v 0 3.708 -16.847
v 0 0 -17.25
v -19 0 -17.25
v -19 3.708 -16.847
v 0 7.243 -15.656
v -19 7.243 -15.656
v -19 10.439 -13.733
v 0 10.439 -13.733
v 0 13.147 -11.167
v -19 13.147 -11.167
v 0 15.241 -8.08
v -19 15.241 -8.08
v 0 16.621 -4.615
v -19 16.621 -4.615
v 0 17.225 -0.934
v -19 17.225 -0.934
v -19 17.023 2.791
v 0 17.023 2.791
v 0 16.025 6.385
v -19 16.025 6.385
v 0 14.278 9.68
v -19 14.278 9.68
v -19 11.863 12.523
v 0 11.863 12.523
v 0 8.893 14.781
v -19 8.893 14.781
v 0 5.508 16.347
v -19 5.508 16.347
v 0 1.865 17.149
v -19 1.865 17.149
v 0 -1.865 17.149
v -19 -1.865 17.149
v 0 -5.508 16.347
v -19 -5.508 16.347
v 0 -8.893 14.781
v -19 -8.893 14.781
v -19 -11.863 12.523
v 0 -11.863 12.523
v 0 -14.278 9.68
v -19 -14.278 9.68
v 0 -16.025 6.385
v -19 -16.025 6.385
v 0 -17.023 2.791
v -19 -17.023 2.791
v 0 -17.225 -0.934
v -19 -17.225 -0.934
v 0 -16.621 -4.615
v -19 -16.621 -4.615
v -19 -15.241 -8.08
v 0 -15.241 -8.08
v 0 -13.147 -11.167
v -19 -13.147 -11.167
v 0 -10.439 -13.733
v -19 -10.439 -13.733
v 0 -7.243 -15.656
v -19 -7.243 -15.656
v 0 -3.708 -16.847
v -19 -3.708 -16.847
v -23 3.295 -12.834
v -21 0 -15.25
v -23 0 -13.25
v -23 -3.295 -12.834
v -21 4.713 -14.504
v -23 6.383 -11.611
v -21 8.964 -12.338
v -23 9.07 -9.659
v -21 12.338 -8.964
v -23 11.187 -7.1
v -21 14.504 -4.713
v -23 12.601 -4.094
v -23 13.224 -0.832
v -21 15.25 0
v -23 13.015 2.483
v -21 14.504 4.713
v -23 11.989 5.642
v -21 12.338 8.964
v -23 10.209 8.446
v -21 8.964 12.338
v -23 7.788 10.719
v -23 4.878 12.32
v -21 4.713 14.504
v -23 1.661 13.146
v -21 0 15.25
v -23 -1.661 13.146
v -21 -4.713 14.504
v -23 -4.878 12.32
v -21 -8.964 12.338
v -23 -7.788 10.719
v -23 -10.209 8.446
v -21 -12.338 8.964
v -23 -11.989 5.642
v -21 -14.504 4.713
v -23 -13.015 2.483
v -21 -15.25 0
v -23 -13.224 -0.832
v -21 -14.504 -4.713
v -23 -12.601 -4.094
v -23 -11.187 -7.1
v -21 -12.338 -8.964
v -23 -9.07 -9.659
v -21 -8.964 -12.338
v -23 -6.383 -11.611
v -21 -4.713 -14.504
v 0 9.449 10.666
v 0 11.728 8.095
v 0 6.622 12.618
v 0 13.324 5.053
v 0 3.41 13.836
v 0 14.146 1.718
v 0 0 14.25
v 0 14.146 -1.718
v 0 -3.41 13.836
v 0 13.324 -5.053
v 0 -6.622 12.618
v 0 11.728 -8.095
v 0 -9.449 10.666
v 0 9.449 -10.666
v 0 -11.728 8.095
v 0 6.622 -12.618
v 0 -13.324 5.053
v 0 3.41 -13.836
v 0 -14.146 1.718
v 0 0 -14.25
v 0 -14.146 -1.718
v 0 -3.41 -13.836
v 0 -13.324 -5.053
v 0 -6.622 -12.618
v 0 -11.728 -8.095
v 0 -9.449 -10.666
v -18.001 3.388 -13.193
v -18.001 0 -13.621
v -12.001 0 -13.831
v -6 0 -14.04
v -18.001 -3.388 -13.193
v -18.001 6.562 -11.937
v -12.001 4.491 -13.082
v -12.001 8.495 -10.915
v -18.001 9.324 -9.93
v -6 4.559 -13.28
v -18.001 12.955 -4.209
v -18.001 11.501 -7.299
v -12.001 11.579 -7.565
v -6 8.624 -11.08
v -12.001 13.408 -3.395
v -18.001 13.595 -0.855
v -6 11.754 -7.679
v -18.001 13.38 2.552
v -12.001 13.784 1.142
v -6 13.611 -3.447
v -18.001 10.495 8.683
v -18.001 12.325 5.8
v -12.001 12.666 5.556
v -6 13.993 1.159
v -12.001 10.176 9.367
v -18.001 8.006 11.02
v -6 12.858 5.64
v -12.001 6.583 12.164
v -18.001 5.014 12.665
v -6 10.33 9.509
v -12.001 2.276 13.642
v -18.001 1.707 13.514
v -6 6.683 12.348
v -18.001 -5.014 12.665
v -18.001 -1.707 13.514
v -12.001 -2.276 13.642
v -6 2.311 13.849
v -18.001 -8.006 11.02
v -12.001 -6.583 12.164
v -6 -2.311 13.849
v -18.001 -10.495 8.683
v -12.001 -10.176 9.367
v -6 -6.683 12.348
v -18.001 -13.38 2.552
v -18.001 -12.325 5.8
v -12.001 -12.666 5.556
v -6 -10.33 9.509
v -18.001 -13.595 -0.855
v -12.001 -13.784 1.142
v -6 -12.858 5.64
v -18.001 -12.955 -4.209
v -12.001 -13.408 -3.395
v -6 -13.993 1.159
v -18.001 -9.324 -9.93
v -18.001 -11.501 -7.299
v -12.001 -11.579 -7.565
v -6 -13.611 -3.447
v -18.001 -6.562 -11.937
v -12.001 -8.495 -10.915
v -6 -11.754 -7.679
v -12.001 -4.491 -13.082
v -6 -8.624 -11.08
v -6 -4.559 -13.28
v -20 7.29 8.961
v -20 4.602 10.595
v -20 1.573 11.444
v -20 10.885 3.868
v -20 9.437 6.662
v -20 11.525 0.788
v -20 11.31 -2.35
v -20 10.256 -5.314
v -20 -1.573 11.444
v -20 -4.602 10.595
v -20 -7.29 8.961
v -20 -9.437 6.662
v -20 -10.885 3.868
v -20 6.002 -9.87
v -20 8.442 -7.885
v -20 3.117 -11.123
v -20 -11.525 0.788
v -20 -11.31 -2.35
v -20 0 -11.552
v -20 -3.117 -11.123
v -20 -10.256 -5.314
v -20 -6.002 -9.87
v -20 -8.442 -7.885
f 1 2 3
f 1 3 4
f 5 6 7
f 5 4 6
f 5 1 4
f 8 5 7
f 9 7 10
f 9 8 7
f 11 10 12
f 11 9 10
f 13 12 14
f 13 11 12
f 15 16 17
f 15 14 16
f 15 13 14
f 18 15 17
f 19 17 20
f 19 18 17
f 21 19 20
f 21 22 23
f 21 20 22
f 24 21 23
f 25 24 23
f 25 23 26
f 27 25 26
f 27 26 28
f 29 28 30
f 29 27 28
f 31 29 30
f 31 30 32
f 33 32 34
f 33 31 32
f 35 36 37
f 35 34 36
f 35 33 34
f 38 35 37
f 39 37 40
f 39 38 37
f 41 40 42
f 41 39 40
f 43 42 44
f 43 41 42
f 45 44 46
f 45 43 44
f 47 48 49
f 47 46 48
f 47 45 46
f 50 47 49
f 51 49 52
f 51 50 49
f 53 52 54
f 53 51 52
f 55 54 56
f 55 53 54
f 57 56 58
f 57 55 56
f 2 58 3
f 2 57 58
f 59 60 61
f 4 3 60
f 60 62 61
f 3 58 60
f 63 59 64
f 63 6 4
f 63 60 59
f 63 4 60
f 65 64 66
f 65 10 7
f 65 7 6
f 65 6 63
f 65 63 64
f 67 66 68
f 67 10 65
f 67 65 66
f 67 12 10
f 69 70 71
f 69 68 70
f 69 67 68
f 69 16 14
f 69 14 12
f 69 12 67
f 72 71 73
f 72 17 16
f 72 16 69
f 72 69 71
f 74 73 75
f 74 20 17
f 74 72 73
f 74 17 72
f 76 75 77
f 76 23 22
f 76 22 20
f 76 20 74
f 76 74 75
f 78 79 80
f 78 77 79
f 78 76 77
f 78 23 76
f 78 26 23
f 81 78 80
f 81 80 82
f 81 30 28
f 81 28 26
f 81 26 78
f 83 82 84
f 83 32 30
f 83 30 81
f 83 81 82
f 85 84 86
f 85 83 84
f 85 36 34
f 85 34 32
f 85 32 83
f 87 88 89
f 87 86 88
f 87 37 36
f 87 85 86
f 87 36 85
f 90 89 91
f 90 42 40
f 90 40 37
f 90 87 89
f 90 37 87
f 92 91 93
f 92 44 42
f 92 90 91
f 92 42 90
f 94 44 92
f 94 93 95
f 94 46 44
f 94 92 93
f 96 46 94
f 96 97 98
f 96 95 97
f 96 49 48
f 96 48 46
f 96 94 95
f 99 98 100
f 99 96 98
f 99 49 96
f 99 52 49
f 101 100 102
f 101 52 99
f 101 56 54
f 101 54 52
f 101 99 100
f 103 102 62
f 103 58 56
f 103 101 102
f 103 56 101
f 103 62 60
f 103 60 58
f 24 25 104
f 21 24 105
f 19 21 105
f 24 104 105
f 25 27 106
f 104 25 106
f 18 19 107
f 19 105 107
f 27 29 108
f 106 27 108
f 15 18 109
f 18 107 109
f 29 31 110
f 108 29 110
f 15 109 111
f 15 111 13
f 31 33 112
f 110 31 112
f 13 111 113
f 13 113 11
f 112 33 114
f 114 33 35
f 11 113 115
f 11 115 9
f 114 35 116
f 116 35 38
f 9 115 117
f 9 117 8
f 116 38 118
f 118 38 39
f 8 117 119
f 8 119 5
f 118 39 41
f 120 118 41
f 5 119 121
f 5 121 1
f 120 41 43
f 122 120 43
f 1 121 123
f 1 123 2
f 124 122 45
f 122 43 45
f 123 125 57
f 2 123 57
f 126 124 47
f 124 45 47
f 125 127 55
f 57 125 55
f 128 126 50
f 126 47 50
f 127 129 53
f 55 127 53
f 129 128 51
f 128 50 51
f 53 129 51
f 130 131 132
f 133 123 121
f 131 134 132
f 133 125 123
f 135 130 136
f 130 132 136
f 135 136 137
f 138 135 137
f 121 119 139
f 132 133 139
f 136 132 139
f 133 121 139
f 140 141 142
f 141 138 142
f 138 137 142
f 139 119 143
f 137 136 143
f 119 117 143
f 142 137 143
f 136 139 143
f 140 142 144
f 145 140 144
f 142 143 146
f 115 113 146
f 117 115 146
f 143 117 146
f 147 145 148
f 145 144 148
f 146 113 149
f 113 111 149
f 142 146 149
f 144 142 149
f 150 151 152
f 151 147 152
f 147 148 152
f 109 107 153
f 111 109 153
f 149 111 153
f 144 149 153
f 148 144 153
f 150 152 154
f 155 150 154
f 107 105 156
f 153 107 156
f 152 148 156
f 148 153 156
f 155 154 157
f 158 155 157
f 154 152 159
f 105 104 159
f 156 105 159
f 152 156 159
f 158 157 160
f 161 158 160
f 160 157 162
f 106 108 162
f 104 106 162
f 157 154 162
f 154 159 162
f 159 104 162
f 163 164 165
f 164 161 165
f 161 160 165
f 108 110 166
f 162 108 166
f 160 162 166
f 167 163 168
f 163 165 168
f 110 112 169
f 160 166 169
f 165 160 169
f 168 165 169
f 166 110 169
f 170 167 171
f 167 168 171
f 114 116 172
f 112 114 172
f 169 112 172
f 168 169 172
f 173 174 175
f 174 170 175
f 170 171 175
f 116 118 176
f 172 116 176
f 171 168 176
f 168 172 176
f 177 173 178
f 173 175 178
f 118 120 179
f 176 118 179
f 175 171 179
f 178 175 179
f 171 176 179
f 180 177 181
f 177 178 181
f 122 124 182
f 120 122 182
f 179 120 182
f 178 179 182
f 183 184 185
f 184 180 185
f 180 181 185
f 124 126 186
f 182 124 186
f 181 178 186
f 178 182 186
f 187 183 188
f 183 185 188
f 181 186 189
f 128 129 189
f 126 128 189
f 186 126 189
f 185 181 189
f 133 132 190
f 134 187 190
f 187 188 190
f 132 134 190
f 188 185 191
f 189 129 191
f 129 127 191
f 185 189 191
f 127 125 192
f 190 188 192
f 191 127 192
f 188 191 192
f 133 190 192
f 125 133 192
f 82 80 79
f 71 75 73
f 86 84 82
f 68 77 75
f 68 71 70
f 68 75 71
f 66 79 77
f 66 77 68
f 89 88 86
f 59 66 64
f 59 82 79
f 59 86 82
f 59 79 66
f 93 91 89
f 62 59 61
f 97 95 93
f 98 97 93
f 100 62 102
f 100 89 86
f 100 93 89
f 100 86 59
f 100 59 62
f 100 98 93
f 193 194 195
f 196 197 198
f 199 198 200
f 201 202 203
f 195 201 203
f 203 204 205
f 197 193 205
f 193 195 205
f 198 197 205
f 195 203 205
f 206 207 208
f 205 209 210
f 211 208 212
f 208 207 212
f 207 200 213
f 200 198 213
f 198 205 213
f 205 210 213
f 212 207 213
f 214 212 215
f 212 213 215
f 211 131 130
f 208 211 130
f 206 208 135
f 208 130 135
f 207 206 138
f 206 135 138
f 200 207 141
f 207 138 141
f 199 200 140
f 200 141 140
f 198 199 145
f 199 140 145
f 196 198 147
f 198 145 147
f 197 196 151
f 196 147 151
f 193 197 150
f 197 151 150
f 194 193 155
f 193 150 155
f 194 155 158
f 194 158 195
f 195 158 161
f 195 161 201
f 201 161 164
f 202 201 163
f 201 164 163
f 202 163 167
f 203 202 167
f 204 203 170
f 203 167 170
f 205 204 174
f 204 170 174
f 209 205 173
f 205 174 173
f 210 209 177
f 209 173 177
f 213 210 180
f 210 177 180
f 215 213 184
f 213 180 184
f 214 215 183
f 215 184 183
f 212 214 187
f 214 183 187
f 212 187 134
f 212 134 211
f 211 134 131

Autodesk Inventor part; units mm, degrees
ref_plane "YZ Plane" through (0, 0, 0) normal (1, 0, 0) x (0, 1, 0)
ref_plane "XZ Plane" through (0, 0, 0) normal (0, 1, 0) x (-1, 0, 0)
ref_plane "XY Plane" through (0, 0, 0) normal (0, 0, 1) x (1, 0, 0)
sketch "Sketch1" plane through (0, 0, 0) normal (0, 1, 0) x (-1, 0, 0)
  line L0 (23, 0) -> (23, -17.25)
  line L1 (23, -17.25) -> (0, -17.25)
  line L2 (0, -17.25) -> (0, -14.25)
  line L3 (0, -14.25) -> (20, -13.5516)
  line L4 (20, -13.5516) -> (20, 0)
  line L5 (20, 0) -> (23, 0)
  line L6 (0, 0) -> (20, 0) construction
  dimension "d0" = 2
  dimension "d1" = 28.5
  dimension "d2" = 20
  dimension "d3" = 3
  dimension "d4" = 3
  dimension "d14" = 27.1032
revolve "Revolution1" add sketch "Sketch1" angle 360 about axis through (0, 0, 0) along (-1, 0, 0)
chamfer "Chamfer1" distance 4 angle 45 1 edges at (-23, 0, 17.25)
chamfer "Chamfer2" distance 2 angle 45 1 edges at (-20, 0, 13.5516)
properties part number "vacum_cap"
